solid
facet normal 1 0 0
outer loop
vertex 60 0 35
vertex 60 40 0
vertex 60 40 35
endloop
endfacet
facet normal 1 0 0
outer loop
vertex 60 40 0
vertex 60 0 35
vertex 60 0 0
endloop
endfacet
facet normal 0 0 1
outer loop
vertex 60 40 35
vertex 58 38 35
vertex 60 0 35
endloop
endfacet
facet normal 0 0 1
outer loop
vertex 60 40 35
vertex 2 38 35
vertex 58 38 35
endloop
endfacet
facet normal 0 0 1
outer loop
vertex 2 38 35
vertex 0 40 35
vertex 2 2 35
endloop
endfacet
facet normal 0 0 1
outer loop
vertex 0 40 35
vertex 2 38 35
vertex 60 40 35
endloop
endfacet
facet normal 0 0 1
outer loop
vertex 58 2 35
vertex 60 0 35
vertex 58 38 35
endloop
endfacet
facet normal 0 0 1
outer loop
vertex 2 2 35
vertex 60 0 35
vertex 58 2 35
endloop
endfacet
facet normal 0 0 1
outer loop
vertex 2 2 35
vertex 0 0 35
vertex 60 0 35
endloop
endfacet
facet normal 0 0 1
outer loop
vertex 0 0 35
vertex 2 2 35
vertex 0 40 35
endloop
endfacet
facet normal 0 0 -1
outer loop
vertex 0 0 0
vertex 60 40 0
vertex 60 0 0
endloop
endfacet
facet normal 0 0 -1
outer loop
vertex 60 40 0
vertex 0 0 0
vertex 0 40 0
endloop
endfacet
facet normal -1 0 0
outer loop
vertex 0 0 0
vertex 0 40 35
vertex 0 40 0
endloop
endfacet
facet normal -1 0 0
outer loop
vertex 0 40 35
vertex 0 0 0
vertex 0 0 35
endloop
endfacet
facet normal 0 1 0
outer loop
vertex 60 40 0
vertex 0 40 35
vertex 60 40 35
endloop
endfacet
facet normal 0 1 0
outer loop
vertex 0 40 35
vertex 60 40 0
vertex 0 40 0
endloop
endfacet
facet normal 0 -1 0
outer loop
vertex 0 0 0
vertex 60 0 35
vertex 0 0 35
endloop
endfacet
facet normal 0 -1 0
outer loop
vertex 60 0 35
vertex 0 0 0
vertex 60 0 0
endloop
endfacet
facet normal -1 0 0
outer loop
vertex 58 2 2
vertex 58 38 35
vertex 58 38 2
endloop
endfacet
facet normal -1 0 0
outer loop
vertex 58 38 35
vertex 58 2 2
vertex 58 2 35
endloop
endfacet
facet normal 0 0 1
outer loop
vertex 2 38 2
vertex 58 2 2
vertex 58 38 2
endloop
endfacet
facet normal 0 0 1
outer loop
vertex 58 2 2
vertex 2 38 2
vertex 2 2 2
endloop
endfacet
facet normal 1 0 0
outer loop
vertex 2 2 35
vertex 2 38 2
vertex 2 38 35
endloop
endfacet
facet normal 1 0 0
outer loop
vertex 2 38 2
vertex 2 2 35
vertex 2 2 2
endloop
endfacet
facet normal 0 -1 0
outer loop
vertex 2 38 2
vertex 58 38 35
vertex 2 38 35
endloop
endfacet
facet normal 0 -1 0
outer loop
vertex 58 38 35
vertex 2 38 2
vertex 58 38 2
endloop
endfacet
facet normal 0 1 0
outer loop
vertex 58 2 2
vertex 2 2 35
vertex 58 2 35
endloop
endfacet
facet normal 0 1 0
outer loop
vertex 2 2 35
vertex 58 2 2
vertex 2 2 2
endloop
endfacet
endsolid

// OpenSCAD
module worm_box(){
  difference(){
    cube([60,40,35]);
    translate([2,2,2]) cube([56,36,33]);
  }
}
worm_box();
